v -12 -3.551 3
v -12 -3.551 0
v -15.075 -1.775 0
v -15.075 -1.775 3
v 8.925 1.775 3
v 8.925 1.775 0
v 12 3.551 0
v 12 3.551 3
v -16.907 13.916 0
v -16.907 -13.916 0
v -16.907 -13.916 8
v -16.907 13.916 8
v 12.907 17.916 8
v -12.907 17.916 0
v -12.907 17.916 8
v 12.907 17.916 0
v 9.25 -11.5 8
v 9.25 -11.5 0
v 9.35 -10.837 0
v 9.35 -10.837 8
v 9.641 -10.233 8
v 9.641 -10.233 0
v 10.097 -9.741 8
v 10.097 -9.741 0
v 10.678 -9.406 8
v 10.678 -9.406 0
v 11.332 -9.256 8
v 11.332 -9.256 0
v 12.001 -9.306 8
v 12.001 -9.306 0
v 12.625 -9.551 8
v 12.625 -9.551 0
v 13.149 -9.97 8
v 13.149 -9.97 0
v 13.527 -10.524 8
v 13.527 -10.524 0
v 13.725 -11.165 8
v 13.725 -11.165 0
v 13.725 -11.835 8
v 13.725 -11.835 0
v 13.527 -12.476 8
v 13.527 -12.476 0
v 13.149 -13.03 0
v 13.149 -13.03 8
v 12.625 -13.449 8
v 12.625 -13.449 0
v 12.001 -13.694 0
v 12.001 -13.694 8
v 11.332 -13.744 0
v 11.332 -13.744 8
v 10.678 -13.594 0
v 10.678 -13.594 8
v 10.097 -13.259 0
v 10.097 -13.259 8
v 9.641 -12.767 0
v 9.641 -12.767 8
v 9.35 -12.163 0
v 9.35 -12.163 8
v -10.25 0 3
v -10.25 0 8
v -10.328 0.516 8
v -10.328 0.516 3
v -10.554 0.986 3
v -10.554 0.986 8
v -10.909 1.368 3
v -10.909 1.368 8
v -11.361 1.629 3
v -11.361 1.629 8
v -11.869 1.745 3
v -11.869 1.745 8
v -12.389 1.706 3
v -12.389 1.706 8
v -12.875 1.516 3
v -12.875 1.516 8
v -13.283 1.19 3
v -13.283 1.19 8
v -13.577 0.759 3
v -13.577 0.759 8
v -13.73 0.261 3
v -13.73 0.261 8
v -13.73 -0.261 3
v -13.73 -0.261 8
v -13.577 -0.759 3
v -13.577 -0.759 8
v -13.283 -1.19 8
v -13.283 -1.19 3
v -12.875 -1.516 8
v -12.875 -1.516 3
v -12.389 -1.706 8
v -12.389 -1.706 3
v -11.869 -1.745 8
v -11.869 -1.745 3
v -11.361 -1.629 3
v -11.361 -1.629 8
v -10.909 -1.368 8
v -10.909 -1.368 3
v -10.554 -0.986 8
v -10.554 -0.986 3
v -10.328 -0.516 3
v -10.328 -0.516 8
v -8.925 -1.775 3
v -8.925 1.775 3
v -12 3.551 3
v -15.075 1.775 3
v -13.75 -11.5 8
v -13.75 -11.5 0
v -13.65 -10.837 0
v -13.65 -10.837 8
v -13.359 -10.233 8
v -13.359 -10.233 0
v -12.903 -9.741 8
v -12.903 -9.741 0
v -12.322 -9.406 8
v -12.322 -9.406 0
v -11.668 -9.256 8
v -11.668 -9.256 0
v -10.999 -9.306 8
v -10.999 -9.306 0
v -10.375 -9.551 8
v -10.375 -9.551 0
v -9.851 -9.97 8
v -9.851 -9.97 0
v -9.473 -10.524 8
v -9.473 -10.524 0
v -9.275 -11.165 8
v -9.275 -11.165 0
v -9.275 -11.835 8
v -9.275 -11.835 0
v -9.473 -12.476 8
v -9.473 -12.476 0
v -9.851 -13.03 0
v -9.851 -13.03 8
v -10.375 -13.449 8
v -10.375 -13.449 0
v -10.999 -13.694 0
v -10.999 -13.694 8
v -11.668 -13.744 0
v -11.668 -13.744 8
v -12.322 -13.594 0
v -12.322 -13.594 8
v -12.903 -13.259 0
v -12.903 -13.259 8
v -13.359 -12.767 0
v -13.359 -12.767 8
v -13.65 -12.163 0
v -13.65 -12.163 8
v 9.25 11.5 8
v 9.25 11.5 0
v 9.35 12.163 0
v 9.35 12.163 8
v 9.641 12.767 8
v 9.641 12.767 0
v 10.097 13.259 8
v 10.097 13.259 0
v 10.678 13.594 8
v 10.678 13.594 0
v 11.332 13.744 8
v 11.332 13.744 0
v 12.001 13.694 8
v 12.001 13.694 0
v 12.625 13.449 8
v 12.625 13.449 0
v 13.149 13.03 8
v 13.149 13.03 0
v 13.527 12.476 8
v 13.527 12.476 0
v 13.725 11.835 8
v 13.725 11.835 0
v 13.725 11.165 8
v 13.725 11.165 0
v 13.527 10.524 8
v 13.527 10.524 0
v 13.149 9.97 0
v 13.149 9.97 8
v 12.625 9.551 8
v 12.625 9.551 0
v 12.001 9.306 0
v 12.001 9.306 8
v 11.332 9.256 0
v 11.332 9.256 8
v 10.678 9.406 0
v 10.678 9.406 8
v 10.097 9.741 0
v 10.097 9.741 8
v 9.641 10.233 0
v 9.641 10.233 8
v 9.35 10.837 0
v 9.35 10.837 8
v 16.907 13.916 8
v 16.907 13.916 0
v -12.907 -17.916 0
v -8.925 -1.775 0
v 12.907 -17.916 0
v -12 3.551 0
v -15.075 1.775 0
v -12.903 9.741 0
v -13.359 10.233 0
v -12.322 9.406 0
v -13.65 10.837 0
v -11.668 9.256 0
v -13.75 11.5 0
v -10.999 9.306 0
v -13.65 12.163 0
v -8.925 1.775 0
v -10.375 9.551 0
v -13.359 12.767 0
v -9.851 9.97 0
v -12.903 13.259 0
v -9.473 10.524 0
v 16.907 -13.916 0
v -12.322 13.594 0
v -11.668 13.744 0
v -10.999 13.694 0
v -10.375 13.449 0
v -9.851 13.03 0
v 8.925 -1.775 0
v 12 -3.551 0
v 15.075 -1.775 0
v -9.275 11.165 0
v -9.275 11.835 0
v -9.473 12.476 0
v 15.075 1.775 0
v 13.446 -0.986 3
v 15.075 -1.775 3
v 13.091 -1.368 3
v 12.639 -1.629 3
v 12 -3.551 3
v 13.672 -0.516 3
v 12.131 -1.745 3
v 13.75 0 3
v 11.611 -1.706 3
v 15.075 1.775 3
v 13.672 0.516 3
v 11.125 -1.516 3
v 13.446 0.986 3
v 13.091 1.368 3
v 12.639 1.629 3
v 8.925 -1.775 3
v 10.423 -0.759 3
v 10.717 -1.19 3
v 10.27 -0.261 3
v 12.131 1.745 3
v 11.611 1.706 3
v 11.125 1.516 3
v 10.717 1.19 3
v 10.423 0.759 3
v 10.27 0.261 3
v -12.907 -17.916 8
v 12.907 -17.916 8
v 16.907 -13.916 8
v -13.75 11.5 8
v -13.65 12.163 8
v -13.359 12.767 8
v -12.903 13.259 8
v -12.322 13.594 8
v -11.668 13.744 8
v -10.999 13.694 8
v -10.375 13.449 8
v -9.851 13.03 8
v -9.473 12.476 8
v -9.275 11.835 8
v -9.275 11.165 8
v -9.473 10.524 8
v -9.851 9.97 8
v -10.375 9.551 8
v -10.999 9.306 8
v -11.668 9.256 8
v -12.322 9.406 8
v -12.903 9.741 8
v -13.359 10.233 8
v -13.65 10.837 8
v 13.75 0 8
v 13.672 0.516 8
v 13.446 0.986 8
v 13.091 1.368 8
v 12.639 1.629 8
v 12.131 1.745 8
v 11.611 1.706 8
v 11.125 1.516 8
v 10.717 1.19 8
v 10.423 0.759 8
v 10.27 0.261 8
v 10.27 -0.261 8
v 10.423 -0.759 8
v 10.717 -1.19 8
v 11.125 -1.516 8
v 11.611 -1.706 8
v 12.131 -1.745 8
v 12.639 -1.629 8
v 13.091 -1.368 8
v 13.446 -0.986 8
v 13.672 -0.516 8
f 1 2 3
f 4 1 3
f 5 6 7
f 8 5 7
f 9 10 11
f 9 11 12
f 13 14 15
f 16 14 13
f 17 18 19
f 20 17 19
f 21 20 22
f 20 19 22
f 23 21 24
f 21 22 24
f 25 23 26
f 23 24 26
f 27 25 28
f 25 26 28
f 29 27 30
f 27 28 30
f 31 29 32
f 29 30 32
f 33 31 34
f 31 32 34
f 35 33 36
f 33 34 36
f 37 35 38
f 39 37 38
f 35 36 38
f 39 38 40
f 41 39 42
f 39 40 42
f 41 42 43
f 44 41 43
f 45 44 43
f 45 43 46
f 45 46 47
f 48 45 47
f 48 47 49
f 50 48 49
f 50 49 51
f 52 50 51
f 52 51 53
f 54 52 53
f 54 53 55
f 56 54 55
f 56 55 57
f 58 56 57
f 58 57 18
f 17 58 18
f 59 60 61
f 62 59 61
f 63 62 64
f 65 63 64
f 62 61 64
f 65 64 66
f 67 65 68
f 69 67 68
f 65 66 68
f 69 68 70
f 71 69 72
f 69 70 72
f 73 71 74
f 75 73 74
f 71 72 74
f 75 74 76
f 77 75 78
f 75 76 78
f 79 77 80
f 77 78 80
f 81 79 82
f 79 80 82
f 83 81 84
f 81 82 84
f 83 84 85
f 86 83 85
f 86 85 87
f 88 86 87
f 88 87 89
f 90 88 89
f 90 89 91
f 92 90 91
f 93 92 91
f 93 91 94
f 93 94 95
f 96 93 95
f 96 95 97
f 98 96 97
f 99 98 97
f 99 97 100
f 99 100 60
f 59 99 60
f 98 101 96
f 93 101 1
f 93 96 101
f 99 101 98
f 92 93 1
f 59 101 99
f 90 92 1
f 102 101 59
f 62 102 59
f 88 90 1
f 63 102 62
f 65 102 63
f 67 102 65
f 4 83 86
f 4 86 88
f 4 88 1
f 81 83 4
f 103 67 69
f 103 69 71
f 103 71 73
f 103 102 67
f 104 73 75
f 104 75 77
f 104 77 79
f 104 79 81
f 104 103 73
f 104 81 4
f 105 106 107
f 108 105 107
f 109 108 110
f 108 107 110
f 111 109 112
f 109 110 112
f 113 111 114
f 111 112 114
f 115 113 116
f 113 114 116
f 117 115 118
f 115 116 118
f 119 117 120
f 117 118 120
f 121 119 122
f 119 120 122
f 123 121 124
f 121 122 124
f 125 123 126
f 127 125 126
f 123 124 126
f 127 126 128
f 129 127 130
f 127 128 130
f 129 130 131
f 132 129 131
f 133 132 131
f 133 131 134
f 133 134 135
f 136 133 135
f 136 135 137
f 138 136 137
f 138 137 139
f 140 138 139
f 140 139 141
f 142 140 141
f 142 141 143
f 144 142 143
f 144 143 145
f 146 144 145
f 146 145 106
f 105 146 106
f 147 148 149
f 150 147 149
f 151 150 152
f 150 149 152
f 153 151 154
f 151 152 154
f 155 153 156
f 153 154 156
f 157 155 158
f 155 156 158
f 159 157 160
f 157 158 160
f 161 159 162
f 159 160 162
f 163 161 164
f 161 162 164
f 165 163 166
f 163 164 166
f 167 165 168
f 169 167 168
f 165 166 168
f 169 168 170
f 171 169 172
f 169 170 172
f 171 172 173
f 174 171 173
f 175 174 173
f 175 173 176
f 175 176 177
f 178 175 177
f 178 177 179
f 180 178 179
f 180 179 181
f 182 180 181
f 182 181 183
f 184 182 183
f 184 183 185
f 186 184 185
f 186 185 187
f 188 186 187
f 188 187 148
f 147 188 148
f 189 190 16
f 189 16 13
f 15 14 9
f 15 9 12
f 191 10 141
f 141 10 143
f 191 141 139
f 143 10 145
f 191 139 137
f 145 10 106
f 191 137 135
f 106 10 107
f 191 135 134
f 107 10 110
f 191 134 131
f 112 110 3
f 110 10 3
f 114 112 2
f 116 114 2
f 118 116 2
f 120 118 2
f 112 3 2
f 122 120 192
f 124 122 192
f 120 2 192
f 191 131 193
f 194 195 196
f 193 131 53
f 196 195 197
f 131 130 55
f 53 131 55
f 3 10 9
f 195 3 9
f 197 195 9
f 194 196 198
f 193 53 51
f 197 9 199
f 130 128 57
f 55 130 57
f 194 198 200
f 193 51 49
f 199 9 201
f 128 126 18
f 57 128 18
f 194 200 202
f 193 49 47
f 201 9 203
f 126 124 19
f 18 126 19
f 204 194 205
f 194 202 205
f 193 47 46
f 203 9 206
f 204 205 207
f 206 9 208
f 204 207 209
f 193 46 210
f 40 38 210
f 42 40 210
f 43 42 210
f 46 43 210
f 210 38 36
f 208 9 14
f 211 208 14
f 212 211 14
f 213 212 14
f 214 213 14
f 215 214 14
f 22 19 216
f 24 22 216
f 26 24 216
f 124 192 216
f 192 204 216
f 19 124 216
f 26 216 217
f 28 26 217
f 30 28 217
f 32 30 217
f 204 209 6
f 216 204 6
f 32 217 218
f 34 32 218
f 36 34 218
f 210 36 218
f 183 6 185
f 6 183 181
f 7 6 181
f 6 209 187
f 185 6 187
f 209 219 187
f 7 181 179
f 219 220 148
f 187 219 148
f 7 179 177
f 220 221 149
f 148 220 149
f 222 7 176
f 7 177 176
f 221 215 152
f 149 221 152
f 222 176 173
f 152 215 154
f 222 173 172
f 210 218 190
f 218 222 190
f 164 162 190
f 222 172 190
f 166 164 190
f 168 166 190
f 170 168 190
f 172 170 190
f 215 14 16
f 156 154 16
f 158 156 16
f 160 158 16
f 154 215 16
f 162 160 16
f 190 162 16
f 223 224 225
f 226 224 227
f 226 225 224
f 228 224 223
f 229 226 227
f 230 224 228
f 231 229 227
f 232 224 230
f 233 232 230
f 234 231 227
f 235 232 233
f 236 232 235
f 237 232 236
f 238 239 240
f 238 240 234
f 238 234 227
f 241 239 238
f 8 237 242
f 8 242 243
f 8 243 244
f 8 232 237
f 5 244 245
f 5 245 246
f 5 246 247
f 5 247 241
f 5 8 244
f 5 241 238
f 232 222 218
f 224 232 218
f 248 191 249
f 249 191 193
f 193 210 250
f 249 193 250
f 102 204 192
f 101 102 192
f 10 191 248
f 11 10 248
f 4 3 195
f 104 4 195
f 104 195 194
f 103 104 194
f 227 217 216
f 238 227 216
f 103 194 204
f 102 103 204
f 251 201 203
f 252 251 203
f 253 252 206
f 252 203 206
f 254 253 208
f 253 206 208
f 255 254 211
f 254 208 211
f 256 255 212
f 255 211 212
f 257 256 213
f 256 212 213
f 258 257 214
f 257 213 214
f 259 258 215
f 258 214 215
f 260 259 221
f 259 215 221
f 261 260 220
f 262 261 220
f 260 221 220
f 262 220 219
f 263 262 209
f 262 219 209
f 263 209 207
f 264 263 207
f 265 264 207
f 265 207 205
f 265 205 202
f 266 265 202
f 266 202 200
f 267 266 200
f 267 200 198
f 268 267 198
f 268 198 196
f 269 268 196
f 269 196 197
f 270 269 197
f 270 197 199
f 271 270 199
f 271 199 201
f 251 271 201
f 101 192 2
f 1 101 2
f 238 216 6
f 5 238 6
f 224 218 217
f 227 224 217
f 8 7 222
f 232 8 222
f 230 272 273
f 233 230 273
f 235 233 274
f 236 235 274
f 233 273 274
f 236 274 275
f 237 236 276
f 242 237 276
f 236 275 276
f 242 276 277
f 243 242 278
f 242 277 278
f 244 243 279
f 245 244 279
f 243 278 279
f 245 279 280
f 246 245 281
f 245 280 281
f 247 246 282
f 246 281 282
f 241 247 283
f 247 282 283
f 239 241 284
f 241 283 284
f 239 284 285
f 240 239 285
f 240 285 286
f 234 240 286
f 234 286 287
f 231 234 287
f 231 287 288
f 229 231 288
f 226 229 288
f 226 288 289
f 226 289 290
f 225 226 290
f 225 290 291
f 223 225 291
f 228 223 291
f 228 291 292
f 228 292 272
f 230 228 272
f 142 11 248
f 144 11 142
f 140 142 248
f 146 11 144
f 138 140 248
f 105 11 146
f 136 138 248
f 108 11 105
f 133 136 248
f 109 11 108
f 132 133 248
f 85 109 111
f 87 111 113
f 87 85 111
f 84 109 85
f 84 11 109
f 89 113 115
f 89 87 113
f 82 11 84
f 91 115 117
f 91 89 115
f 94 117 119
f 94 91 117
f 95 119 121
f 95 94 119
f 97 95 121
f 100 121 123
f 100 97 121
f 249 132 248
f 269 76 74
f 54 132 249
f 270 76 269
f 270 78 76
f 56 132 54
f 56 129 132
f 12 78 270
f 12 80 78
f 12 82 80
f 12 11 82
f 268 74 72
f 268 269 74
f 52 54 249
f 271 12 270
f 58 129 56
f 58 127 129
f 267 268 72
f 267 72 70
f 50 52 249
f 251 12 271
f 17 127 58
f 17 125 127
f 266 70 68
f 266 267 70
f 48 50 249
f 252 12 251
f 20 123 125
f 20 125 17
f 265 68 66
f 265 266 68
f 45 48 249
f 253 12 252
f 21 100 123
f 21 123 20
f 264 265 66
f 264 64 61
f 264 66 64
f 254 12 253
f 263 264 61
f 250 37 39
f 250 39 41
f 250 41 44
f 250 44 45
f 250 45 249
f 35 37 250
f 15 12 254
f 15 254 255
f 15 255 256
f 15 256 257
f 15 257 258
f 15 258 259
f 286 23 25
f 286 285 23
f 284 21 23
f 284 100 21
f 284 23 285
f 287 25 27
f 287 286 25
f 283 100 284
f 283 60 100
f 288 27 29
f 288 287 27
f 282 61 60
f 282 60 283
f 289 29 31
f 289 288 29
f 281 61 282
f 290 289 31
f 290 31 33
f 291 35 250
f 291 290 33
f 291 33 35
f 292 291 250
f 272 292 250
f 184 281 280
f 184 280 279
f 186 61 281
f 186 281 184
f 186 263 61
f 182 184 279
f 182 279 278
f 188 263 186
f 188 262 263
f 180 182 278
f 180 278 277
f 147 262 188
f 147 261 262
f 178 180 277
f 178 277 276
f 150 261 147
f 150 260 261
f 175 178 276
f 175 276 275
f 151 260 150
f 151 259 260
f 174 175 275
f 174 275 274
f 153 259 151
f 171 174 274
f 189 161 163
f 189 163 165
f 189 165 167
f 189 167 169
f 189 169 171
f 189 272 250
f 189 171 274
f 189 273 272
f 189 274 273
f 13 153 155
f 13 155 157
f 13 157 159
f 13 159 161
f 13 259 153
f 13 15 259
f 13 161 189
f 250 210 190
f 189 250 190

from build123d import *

# Parameters (mm, degrees)
SKETCH1_W           = 33.814565048
SKETCH1_H           = 35.83261461
BOSS_EXTRUDE1_DEPTH = 8
SKETCH2_R           = 1.75
CUT_EXTRUDE1_DEPTH  = 8
SKETCH3_R           = 2.25
CUT_EXTRUDE2_DEPTH  = 10
CHAMFER1_SIZE       = 4
CUT_EXTRUDE3_DEPTH  = 3


with BuildPart() as part:
    # Sketch1 → Boss-Extrude1 (new body)
    with BuildSketch(Plane.XY):
        Rectangle(SKETCH1_W, SKETCH1_H)
    extrude(amount=BOSS_EXTRUDE1_DEPTH)

    # Sketch2 → Cut-Extrude1 (cut)
    with BuildSketch(Plane.XY.offset(8)):
        with Locations((-12, 0)):
            Circle(SKETCH2_R)
        with Locations((12, 0)):
            Circle(SKETCH2_R)
    extrude(amount=-CUT_EXTRUDE1_DEPTH, mode=Mode.SUBTRACT)

    # Sketch3 → Cut-Extrude2 (cut)
    with BuildSketch(Plane(origin=(0, 0, 0), x_dir=(-1, 0, 0), z_dir=(0, 0, -1))):
        with Locations((11.5, -11.5)):
            Circle(SKETCH3_R)
        with Locations((-11.5, -11.5)):
            Circle(SKETCH3_R)
        with Locations((-11.5, 11.5)):
            Circle(SKETCH3_R)
        with Locations((11.5, 11.5)):
            Circle(SKETCH3_R)
    extrude(amount=-CUT_EXTRUDE2_DEPTH, mode=Mode.SUBTRACT)

    # Chamfer1
    chamfer1_edges = [part.edges().sort_by_distance(p)[0] for p in [
        (-16.907282524, 17.916307305, 4),
        (16.907282524, 17.916307305, 4),
        (16.907282524, -17.916307305, 4),
        (-16.907282524, -17.916307305, 4),
    ]]
    chamfer(chamfer1_edges, length=CHAMFER1_SIZE)

    # Sketch4 → Cut-Extrude3 (cut)
    with BuildSketch(Plane(origin=(0, 0, 0), x_dir=(-1, 0, 0), z_dir=(0, 0, -1))):
        Polygon((-12, -3.550704156), (-8.925, -1.775352078), (-8.925, 1.775352078), (-12, 3.550704156), (-15.075, 1.775352078), (-15.075, -1.775352078), align=None)
        Polygon((12, -3.550704156), (15.075, -1.775352078), (15.075, 1.775352078), (12, 3.550704156), (8.925, 1.775352078), (8.925, -1.775352078), align=None)
    extrude(amount=-CUT_EXTRUDE3_DEPTH, mode=Mode.SUBTRACT)


solid = part.part
